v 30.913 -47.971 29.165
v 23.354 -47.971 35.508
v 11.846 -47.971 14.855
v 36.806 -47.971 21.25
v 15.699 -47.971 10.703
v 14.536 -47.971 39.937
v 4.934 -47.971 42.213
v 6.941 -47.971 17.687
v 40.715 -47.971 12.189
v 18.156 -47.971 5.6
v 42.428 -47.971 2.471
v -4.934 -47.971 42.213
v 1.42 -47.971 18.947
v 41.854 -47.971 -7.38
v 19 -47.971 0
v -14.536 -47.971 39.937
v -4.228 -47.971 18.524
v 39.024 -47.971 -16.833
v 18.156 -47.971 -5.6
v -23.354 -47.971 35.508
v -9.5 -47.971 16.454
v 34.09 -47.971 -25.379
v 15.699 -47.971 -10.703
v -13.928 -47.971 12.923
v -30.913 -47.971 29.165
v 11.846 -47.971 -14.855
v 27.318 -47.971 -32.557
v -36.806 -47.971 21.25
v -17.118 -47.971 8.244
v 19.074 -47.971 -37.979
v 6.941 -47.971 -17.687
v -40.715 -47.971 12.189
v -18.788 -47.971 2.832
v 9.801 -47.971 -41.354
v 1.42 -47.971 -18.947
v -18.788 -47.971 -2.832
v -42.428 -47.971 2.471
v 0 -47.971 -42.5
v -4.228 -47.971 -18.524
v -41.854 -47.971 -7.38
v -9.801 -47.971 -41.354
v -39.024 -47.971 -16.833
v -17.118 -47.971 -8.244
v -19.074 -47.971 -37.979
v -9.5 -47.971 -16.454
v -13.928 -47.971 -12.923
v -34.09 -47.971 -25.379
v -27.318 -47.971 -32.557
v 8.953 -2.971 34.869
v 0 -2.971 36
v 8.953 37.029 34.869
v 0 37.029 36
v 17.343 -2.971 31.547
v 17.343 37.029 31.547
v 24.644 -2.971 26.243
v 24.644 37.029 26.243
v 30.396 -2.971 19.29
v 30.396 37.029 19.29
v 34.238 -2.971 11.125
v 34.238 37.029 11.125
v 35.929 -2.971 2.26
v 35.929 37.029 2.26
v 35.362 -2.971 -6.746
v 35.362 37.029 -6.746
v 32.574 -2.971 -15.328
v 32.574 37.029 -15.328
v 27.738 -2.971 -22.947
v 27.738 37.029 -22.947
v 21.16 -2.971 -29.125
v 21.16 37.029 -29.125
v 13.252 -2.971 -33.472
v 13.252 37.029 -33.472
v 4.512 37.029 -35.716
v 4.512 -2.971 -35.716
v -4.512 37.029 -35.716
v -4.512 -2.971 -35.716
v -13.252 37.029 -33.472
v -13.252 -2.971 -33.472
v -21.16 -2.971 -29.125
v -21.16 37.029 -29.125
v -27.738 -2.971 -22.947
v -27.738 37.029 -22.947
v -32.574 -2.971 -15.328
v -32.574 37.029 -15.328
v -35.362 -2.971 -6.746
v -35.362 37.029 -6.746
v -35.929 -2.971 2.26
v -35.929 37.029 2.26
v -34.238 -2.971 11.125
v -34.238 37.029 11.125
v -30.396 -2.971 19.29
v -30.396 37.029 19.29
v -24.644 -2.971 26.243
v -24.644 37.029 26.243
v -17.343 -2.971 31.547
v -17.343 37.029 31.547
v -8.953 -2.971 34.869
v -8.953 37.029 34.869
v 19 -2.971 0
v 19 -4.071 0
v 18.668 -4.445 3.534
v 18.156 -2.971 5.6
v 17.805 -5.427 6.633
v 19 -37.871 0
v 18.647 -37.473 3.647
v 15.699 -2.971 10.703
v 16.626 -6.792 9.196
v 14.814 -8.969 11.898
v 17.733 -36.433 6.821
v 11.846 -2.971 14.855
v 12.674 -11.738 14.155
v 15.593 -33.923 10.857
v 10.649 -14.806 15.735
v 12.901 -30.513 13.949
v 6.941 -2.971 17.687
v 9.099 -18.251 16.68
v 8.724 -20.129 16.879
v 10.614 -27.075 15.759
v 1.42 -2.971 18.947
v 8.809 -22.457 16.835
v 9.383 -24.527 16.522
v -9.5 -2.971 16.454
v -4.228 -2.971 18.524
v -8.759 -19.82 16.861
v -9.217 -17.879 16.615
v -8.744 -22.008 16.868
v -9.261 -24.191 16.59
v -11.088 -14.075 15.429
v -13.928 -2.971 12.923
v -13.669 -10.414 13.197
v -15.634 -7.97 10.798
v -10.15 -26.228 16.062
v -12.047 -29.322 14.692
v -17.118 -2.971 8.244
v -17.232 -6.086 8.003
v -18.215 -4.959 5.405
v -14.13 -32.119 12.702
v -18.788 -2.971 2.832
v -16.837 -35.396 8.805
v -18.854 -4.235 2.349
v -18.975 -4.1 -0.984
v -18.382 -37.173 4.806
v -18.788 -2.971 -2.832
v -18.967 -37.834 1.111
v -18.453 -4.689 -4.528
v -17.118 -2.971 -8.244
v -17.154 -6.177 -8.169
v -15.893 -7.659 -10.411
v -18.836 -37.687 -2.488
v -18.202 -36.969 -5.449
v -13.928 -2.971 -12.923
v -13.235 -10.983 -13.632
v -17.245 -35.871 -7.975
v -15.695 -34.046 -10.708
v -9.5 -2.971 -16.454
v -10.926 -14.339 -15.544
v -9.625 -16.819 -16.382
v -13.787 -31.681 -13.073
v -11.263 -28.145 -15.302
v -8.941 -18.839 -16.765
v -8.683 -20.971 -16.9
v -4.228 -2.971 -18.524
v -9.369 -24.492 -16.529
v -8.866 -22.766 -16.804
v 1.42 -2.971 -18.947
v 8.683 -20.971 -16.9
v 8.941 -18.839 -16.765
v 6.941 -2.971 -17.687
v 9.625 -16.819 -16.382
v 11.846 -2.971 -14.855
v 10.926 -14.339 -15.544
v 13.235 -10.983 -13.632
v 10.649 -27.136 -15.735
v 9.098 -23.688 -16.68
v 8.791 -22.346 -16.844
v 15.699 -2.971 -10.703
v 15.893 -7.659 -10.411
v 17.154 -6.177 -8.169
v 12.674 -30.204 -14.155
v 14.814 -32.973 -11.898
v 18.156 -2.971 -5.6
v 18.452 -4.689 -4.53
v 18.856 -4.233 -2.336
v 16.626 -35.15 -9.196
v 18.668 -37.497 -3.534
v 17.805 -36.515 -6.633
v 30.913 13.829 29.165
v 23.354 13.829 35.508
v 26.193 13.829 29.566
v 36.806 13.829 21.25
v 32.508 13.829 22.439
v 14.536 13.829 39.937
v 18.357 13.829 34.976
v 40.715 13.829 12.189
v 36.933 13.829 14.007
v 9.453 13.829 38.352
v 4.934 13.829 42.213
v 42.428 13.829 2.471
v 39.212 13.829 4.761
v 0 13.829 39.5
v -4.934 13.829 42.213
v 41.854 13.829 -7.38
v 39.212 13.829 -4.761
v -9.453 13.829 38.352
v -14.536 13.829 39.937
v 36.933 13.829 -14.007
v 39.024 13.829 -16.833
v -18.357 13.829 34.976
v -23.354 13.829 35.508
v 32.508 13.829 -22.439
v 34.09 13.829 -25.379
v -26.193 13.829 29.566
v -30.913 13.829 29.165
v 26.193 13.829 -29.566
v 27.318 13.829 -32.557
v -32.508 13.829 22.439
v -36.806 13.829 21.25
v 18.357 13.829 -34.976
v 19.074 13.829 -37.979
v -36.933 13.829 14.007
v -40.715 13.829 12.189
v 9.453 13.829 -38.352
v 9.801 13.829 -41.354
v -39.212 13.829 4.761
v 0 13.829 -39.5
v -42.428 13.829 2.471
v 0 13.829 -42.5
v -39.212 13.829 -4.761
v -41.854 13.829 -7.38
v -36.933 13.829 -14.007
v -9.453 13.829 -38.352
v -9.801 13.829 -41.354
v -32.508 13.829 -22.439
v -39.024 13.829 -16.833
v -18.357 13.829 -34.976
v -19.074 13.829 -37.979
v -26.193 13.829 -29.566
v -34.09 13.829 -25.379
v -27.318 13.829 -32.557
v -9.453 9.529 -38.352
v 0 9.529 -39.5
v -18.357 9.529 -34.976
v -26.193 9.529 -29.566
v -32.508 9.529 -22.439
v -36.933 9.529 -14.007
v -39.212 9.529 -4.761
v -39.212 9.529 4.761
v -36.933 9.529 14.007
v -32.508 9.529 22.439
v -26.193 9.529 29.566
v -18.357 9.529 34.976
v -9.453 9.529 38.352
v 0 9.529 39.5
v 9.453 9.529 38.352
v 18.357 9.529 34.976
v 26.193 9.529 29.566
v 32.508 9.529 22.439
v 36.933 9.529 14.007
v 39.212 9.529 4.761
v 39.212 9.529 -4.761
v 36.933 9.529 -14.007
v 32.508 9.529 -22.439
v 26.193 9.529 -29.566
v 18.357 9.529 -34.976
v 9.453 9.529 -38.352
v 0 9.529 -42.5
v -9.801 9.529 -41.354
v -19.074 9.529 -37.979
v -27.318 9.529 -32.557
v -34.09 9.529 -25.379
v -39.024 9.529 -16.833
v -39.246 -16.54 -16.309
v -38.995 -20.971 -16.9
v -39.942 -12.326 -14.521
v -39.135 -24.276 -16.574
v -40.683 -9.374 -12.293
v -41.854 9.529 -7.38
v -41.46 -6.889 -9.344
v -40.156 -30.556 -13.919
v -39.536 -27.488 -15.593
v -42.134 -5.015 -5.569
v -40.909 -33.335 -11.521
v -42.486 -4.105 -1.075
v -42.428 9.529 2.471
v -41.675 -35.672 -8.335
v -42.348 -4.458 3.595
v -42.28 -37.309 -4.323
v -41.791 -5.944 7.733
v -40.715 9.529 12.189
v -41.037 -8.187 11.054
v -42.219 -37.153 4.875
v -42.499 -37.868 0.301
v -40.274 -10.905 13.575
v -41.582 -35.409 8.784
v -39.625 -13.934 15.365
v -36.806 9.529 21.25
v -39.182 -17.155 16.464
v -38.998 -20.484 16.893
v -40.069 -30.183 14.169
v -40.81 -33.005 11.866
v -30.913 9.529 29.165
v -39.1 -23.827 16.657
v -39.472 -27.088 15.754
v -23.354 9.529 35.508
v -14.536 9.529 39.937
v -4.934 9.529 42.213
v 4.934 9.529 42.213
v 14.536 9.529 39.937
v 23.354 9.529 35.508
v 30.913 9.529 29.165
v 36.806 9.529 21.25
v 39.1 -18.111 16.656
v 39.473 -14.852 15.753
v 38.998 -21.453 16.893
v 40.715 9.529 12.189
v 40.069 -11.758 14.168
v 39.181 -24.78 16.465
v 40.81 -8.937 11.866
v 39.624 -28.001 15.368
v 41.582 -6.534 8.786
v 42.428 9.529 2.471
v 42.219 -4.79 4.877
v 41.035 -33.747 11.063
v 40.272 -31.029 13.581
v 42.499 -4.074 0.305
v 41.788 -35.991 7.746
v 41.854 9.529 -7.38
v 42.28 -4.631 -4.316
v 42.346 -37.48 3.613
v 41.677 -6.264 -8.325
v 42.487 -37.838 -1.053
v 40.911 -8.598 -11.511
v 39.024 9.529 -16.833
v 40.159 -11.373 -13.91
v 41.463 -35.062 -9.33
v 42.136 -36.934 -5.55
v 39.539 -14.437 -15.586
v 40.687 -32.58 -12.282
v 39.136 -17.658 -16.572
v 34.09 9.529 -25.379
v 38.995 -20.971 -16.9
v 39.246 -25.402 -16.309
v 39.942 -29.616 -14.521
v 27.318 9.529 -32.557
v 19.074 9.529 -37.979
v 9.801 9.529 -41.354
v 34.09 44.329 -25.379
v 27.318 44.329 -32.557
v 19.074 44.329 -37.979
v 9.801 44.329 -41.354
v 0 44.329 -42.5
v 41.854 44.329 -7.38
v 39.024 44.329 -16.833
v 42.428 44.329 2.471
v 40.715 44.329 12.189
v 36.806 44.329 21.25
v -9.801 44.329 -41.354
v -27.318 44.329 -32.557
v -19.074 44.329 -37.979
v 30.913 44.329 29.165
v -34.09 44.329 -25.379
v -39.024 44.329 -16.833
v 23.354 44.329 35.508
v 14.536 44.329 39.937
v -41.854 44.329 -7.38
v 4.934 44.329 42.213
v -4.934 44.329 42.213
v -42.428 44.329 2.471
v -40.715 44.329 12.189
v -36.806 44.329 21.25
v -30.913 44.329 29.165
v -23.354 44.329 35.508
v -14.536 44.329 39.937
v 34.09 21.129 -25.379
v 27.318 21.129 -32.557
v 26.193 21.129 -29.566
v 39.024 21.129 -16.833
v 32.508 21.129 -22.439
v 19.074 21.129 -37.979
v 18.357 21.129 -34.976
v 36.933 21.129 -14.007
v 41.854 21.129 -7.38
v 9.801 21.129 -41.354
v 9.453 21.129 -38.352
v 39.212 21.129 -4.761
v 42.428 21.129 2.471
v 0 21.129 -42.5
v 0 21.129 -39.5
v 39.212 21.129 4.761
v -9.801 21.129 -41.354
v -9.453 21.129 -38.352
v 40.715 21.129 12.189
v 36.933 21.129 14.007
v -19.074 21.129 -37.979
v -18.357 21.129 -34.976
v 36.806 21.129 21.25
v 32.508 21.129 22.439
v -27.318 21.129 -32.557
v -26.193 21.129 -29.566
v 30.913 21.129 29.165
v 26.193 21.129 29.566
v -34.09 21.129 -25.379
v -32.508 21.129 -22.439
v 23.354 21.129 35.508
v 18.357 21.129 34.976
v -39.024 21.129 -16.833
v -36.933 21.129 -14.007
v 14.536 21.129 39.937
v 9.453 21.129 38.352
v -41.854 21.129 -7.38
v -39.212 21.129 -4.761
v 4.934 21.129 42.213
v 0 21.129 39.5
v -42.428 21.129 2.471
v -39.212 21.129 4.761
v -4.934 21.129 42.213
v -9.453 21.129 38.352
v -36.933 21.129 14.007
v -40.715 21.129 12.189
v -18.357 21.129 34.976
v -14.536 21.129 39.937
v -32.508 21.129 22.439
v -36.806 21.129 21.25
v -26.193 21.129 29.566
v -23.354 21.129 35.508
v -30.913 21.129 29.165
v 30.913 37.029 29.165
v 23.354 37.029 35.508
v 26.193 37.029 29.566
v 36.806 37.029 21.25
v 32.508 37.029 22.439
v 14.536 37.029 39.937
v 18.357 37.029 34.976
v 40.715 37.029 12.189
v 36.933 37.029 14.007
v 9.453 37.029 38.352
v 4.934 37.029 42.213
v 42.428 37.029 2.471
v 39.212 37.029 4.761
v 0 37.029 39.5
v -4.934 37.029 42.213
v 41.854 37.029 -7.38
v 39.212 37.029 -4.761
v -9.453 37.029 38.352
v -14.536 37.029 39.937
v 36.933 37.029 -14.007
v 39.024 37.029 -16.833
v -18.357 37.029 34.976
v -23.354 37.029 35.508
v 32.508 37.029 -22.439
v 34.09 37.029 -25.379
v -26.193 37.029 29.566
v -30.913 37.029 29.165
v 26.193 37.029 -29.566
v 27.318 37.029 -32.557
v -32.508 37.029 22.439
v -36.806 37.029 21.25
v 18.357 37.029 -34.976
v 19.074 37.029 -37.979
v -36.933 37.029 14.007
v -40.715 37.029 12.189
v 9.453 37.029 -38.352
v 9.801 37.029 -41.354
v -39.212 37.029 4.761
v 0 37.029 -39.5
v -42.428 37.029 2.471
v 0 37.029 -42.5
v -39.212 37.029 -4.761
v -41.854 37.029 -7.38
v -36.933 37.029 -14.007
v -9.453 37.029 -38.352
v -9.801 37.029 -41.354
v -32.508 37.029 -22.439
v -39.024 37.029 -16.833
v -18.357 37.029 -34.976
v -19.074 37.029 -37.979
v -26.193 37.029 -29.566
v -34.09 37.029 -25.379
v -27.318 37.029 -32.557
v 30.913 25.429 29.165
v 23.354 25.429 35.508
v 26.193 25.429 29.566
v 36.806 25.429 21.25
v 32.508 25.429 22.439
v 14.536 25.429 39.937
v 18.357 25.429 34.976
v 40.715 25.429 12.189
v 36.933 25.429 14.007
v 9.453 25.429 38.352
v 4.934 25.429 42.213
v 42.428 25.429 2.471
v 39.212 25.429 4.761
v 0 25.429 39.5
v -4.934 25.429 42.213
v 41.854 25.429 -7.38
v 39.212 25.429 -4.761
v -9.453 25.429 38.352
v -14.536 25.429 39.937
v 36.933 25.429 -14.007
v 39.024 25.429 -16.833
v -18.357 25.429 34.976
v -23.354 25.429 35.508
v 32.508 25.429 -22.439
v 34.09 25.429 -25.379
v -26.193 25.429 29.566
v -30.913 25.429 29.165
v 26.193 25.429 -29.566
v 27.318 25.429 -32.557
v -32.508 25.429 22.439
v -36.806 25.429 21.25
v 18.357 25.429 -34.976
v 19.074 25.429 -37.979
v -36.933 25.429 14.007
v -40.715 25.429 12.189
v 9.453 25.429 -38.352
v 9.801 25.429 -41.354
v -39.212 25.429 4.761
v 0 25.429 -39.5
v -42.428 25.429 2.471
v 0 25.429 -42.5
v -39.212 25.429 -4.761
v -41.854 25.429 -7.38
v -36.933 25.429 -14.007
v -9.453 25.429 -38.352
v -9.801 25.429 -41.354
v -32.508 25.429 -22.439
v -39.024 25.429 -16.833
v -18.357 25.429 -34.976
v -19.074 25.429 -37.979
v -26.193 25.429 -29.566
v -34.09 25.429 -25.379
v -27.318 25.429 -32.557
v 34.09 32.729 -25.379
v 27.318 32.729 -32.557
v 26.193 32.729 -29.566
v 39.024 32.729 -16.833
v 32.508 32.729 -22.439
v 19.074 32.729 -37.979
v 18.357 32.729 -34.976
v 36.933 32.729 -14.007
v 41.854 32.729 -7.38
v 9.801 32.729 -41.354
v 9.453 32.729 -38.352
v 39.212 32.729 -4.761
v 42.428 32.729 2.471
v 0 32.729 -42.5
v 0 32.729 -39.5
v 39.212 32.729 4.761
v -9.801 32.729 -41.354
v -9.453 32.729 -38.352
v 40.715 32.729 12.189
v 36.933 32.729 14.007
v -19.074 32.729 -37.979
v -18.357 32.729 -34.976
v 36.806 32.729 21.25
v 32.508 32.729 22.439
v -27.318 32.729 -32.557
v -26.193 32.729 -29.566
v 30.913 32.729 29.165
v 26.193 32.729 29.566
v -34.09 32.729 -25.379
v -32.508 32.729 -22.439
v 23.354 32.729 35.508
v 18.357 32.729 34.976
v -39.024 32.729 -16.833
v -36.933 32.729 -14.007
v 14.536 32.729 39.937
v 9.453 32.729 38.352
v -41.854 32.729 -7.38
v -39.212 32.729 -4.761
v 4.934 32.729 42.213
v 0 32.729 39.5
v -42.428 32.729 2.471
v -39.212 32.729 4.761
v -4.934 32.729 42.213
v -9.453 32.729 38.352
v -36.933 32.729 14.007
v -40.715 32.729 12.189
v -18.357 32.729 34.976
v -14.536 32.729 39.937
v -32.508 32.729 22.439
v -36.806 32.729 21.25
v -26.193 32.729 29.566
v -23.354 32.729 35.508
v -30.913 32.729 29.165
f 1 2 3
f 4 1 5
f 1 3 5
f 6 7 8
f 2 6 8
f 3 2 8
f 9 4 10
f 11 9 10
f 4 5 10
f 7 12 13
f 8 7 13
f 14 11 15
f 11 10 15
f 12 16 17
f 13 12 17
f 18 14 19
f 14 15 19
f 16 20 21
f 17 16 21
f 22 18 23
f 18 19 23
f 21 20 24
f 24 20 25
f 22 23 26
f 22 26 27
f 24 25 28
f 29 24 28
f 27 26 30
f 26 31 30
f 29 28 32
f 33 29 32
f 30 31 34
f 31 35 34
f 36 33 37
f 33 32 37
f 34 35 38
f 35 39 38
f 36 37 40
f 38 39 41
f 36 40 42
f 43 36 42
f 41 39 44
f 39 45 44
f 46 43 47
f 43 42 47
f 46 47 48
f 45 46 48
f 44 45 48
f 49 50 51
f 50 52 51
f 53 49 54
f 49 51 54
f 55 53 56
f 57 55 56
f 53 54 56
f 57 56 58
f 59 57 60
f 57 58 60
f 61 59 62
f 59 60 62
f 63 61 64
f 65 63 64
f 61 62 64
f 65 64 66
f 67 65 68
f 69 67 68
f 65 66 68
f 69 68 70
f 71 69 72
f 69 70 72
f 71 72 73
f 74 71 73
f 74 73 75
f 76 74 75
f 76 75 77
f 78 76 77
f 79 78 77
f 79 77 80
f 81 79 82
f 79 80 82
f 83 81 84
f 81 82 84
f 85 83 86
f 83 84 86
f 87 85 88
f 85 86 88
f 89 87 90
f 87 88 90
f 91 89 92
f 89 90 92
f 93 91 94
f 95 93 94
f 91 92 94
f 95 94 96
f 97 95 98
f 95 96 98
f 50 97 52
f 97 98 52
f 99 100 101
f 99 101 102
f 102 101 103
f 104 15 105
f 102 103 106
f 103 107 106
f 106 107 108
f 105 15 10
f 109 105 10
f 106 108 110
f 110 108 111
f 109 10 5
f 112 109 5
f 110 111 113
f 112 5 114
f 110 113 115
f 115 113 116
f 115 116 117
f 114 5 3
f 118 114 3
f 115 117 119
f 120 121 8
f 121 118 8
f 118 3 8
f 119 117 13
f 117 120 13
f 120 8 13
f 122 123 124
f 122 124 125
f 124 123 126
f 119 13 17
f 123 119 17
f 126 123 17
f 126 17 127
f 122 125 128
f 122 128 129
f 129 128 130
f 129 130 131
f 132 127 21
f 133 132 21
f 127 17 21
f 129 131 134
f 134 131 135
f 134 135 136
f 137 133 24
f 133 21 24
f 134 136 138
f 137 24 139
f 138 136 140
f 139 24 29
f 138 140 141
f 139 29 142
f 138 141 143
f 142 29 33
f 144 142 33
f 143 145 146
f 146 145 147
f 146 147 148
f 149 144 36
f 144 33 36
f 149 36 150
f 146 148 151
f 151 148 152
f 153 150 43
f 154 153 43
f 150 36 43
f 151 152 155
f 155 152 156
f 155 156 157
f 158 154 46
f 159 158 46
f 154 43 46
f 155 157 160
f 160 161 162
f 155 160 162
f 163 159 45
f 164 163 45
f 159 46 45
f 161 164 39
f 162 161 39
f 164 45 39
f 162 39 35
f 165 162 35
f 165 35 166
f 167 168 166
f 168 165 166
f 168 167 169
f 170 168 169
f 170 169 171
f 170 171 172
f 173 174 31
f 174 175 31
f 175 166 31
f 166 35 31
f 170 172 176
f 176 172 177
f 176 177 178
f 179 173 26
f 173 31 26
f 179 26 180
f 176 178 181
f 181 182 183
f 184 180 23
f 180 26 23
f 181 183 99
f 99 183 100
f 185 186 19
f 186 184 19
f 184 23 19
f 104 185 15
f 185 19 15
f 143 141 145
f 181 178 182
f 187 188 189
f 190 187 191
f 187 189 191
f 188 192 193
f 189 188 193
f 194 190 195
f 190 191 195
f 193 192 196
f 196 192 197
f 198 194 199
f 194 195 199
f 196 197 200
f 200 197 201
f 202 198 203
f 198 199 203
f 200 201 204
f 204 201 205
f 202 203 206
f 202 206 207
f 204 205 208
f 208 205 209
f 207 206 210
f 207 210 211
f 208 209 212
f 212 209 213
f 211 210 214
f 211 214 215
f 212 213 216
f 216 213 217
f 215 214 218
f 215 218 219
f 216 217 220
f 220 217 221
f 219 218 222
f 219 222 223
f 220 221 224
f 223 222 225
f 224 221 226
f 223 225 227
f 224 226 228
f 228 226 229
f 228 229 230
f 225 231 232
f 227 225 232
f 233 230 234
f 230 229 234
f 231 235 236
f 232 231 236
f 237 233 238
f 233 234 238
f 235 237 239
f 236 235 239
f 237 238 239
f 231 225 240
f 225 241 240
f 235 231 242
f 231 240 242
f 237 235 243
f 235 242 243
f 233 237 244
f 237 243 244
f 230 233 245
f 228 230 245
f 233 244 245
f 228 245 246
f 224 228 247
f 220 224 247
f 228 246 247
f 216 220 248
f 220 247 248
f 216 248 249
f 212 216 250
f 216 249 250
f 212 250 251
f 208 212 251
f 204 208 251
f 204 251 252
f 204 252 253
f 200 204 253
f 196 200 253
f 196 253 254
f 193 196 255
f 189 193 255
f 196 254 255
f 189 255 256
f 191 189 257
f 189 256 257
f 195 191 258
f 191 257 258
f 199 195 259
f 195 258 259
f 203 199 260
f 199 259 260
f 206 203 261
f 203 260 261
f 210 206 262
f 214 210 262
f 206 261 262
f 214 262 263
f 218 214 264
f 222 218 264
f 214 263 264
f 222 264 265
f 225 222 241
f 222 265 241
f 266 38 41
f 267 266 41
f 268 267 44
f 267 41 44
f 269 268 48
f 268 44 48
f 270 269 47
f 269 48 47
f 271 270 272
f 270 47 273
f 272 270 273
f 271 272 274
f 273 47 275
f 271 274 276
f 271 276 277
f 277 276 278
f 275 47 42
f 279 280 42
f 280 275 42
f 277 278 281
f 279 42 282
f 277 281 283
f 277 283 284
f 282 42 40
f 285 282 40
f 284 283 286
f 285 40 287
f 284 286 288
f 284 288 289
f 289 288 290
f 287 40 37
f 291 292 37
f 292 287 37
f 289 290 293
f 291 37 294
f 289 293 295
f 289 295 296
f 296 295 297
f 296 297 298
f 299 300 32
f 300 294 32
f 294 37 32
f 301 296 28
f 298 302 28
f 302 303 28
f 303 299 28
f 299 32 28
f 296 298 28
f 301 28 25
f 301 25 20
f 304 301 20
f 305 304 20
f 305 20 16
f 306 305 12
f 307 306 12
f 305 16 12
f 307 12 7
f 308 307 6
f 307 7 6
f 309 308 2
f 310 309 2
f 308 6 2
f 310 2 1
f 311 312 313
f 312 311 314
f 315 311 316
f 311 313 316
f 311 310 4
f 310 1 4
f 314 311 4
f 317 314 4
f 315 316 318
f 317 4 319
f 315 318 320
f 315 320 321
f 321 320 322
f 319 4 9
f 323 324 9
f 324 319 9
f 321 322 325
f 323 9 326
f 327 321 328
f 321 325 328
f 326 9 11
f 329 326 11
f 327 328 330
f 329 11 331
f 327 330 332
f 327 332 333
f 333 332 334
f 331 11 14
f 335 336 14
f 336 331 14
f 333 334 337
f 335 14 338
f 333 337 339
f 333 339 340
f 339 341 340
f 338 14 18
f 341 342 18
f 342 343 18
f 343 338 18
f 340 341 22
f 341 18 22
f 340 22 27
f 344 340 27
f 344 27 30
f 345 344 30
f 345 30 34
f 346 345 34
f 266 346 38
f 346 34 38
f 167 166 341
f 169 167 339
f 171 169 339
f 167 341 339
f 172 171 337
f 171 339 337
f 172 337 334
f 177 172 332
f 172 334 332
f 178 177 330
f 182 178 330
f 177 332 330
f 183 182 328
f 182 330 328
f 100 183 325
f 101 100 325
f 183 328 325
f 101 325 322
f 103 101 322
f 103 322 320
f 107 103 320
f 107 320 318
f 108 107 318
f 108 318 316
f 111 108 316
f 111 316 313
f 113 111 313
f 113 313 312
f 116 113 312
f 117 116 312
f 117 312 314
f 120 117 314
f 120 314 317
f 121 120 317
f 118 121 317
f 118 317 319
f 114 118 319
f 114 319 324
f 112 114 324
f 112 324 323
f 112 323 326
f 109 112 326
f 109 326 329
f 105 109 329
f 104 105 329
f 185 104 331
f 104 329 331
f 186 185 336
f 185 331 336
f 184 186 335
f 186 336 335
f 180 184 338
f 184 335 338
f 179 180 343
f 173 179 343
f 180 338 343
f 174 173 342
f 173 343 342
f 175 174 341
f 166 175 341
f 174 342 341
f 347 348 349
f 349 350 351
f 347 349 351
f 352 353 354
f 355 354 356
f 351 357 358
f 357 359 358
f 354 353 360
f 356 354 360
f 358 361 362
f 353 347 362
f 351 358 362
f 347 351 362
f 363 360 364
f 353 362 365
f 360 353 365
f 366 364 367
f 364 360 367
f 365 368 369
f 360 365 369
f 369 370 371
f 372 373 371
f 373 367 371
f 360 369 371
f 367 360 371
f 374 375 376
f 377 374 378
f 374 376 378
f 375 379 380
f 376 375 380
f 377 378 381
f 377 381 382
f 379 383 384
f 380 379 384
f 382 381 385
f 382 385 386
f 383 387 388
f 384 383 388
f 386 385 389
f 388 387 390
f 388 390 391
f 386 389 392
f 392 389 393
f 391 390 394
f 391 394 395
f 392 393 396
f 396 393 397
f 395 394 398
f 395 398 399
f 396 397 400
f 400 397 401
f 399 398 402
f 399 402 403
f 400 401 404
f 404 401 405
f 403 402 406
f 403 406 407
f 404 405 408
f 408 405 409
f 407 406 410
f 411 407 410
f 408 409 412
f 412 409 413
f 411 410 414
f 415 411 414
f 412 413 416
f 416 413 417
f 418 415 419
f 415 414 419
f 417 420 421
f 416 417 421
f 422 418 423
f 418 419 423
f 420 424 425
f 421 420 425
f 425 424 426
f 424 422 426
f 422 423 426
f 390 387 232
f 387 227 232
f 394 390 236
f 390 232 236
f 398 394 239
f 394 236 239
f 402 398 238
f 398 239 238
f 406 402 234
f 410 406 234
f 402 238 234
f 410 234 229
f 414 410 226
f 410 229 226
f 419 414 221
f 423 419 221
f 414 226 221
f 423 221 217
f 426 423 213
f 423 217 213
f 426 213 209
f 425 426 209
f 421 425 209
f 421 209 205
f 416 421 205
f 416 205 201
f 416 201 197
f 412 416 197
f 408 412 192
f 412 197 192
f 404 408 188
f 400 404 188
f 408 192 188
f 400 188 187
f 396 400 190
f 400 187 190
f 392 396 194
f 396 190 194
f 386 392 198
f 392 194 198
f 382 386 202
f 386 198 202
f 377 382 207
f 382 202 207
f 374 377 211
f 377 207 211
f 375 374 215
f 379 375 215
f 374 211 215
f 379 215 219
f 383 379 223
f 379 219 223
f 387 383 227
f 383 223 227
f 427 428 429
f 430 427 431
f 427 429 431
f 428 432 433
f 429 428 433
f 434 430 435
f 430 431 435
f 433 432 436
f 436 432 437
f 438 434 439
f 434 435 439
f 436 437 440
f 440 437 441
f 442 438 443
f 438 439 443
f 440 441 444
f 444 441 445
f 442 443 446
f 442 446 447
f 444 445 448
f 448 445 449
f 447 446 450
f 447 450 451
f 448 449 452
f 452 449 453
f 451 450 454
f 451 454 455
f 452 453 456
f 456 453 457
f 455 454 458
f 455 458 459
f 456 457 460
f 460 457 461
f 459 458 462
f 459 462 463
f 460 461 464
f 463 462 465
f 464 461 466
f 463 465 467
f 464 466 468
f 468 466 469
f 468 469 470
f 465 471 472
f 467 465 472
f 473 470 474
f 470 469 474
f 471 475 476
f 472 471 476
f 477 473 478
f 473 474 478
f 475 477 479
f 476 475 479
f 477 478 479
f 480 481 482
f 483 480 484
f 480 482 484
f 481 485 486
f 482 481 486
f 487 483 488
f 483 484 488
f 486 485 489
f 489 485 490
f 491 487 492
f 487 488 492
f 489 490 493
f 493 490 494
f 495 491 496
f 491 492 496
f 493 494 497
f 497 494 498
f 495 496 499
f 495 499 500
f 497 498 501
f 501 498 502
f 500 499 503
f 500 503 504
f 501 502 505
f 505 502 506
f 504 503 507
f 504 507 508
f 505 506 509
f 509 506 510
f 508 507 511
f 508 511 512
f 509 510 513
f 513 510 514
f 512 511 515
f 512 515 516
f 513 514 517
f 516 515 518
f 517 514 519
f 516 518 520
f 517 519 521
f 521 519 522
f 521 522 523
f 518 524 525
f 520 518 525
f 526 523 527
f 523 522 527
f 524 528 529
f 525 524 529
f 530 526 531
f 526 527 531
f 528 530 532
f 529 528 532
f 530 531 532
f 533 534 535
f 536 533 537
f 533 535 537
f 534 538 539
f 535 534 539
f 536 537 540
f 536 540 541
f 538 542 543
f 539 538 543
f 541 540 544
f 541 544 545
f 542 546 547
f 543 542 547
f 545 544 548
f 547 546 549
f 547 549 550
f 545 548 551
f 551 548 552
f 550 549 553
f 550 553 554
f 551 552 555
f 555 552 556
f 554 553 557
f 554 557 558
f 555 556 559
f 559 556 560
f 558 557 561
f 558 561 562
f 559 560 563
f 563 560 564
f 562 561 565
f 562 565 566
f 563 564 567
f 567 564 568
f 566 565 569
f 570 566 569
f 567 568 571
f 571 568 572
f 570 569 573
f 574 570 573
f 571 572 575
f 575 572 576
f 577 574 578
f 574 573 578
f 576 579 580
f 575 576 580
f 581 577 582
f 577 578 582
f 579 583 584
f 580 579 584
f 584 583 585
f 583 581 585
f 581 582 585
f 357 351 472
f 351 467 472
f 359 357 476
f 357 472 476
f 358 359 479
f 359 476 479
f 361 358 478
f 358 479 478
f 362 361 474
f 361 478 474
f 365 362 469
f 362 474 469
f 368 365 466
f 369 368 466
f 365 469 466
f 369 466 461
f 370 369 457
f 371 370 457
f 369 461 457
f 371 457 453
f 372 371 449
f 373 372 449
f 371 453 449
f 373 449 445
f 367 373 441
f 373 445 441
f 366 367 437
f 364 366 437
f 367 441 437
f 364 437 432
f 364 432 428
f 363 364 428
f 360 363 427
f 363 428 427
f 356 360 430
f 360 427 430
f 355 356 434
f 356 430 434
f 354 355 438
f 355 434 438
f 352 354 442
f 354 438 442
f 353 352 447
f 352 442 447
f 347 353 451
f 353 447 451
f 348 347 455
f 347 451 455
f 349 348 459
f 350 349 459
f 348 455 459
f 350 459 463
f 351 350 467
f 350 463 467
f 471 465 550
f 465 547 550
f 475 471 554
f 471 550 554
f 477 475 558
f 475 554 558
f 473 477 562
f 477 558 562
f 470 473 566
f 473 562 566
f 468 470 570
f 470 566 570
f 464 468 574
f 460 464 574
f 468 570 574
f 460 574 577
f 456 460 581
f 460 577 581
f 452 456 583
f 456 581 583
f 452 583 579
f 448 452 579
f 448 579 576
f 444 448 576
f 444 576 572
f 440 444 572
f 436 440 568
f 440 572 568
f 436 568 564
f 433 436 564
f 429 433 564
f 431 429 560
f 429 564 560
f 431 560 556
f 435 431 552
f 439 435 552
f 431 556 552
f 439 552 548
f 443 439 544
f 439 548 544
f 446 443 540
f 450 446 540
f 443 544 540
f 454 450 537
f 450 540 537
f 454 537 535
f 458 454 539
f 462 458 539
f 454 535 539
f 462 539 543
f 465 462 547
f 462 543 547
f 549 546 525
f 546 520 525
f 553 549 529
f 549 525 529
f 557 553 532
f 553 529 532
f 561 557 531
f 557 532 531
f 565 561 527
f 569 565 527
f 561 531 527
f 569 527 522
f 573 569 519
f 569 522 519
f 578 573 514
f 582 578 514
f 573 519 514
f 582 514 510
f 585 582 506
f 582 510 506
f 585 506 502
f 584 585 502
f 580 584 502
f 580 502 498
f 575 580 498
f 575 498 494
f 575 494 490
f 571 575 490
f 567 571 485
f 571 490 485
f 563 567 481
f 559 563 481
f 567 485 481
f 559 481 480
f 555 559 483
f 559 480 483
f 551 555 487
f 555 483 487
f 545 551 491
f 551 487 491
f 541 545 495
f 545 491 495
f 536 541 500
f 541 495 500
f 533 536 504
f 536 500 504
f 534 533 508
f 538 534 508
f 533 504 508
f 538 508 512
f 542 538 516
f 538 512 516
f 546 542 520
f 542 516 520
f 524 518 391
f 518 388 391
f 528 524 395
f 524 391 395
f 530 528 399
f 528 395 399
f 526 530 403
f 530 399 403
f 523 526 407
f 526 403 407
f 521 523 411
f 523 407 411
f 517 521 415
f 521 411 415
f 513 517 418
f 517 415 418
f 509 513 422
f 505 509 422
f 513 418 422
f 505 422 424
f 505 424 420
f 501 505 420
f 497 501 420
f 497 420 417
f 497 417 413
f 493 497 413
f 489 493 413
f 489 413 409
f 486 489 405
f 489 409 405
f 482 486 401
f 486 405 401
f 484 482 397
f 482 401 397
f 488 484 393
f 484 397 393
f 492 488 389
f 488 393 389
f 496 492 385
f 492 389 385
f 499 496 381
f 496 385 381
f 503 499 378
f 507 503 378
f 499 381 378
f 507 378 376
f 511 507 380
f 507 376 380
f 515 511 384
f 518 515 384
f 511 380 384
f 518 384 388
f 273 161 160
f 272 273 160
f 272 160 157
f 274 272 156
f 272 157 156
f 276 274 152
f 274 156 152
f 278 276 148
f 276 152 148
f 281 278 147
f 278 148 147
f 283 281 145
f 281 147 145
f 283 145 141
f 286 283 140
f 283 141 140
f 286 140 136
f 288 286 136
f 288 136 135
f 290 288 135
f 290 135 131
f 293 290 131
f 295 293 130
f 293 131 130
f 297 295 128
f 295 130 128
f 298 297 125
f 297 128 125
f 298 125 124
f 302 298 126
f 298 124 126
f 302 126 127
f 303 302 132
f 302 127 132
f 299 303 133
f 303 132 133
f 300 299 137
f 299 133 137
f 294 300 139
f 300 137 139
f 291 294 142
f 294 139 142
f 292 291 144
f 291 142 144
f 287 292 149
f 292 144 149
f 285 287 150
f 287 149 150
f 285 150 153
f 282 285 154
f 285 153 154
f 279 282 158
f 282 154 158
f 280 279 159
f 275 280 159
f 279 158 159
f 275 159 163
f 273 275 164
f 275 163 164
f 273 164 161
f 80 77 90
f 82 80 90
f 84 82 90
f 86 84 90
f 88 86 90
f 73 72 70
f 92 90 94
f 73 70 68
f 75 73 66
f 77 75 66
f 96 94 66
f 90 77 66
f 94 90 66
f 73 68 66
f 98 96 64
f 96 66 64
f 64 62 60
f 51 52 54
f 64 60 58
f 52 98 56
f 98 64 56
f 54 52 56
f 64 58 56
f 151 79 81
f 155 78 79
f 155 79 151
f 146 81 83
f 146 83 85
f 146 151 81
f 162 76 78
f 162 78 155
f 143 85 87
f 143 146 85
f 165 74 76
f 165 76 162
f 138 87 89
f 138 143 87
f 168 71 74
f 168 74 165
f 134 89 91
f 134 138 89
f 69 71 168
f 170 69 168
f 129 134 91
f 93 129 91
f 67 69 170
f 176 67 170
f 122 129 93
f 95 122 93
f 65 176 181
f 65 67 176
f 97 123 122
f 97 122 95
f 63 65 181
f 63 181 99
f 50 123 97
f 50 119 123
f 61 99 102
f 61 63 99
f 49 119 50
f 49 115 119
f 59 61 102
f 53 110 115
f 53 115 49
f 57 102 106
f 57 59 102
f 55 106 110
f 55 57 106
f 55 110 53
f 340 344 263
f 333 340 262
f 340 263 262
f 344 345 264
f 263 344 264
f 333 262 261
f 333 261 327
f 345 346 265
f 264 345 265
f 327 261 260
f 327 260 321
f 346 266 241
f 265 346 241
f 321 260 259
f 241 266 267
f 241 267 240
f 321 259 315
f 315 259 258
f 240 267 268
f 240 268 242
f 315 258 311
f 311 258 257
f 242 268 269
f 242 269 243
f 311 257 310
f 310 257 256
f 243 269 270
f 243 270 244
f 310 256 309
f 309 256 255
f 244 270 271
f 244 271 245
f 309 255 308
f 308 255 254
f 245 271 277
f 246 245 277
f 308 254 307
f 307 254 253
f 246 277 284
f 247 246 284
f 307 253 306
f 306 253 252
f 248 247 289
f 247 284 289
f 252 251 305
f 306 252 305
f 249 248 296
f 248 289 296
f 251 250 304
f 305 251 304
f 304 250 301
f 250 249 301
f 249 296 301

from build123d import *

# Parameters (mm, degrees)
SKETCH4_R          = 16.9
CUT_EXTRUDE1_DEPTH = 42.5
SKETCH5_W          = 36
SKETCH5_H          = 40
SKETCH6_R          = 19
CUT_EXTRUDE2_DEPTH = 45


with BuildPart() as part:
    # Sketch2 → Revolve1 (revolve)
    with BuildSketch(Plane(origin=(0, 0, 0), x_dir=(0, 0, -1), z_dir=(1, 0, 0))):
        Polygon((39.5, 25.428946917), (39.5, 21.128946917), (42.5, 21.128946917), (42.5, 13.828946917), (39.5, 13.828946917), (39.5, 9.528946917), (42.5, 9.528946917), (42.5, -47.971053083), (0, -47.971053083), (0, 44.328946917), (42.5, 44.328946917), (42.5, 37.028946917), (39.5, 37.028946917), (39.5, 32.728946917), (42.5, 32.728946917), (42.5, 25.428946917), align=None)
    revolve(axis=Axis((0, -52.221053083, 0), (0, 1, 0)))

    # Sketch4 → Cut-Extrude1 (cut, symmetric)
    with BuildSketch(Plane(origin=(0, 0, 0), x_dir=(0, 0, -1), z_dir=(1, 0, 0))):
        with Locations((0, -20.971053083)):
            Circle(SKETCH4_R)
    extrude(amount=CUT_EXTRUDE1_DEPTH, both=True, mode=Mode.SUBTRACT)

    # Sketch5 → Cut-Revolve1 (revolve, cut)
    with BuildSketch(Plane(origin=(0, 0, 0), x_dir=(0, 0, -1), z_dir=(1, 0, 0))):
        with Locations((-18, 17.028946917)):
            Rectangle(SKETCH5_W, SKETCH5_H)
    revolve(axis=Axis((0, -52.221053083, 0), (0, 1, 0)), mode=Mode.SUBTRACT)

    # Sketch6 → Cut-Extrude2 (cut)
    with BuildSketch(Plane.XZ.offset(47.971053083)):
        Circle(SKETCH6_R)
    extrude(amount=-CUT_EXTRUDE2_DEPTH, mode=Mode.SUBTRACT)


solid = part.part
